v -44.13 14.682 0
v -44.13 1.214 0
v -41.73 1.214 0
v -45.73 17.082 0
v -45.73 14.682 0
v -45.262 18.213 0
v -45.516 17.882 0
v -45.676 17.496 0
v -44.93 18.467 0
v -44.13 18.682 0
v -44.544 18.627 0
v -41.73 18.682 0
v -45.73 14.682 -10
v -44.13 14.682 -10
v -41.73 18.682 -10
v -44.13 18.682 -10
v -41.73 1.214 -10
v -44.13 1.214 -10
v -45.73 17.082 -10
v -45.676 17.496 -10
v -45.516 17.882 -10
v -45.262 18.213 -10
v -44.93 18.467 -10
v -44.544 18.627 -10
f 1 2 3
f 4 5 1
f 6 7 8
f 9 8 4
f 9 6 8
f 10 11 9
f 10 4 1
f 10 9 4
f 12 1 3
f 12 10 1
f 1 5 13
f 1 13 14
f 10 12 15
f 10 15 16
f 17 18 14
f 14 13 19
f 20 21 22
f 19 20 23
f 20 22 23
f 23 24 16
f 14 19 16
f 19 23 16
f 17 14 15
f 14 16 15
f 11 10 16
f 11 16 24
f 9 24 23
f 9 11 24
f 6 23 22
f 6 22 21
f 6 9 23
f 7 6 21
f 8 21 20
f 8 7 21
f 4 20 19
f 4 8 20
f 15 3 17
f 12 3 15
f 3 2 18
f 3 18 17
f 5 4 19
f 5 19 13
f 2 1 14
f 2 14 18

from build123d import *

# Parameters (mm, degrees)
F1_DEPTH = 10


with BuildPart() as f1:
    # F0 (on Top) → F1 (new body)
    with BuildSketch(Plane.XY):
        Polygon((-44.130353, 14.681706), (-44.130353, 1.213891), (-41.730353, 1.213891), (-41.730353, 18.681706), (-44.130353, 18.681706), align=None)
        with BuildLine():
            Line((-45.730353, 14.681706), (-44.130353, 14.681706))
            Line((-44.130353, 14.681706), (-44.130353, 18.681706))
            ThreePointArc((-44.130353, 18.681706), (-45.261724, 18.213077), (-45.730353, 17.081706))
            Line((-45.730353, 17.081706), (-45.730353, 14.681706))
        make_face()
    extrude(amount=-F1_DEPTH)


solid = f1.part
